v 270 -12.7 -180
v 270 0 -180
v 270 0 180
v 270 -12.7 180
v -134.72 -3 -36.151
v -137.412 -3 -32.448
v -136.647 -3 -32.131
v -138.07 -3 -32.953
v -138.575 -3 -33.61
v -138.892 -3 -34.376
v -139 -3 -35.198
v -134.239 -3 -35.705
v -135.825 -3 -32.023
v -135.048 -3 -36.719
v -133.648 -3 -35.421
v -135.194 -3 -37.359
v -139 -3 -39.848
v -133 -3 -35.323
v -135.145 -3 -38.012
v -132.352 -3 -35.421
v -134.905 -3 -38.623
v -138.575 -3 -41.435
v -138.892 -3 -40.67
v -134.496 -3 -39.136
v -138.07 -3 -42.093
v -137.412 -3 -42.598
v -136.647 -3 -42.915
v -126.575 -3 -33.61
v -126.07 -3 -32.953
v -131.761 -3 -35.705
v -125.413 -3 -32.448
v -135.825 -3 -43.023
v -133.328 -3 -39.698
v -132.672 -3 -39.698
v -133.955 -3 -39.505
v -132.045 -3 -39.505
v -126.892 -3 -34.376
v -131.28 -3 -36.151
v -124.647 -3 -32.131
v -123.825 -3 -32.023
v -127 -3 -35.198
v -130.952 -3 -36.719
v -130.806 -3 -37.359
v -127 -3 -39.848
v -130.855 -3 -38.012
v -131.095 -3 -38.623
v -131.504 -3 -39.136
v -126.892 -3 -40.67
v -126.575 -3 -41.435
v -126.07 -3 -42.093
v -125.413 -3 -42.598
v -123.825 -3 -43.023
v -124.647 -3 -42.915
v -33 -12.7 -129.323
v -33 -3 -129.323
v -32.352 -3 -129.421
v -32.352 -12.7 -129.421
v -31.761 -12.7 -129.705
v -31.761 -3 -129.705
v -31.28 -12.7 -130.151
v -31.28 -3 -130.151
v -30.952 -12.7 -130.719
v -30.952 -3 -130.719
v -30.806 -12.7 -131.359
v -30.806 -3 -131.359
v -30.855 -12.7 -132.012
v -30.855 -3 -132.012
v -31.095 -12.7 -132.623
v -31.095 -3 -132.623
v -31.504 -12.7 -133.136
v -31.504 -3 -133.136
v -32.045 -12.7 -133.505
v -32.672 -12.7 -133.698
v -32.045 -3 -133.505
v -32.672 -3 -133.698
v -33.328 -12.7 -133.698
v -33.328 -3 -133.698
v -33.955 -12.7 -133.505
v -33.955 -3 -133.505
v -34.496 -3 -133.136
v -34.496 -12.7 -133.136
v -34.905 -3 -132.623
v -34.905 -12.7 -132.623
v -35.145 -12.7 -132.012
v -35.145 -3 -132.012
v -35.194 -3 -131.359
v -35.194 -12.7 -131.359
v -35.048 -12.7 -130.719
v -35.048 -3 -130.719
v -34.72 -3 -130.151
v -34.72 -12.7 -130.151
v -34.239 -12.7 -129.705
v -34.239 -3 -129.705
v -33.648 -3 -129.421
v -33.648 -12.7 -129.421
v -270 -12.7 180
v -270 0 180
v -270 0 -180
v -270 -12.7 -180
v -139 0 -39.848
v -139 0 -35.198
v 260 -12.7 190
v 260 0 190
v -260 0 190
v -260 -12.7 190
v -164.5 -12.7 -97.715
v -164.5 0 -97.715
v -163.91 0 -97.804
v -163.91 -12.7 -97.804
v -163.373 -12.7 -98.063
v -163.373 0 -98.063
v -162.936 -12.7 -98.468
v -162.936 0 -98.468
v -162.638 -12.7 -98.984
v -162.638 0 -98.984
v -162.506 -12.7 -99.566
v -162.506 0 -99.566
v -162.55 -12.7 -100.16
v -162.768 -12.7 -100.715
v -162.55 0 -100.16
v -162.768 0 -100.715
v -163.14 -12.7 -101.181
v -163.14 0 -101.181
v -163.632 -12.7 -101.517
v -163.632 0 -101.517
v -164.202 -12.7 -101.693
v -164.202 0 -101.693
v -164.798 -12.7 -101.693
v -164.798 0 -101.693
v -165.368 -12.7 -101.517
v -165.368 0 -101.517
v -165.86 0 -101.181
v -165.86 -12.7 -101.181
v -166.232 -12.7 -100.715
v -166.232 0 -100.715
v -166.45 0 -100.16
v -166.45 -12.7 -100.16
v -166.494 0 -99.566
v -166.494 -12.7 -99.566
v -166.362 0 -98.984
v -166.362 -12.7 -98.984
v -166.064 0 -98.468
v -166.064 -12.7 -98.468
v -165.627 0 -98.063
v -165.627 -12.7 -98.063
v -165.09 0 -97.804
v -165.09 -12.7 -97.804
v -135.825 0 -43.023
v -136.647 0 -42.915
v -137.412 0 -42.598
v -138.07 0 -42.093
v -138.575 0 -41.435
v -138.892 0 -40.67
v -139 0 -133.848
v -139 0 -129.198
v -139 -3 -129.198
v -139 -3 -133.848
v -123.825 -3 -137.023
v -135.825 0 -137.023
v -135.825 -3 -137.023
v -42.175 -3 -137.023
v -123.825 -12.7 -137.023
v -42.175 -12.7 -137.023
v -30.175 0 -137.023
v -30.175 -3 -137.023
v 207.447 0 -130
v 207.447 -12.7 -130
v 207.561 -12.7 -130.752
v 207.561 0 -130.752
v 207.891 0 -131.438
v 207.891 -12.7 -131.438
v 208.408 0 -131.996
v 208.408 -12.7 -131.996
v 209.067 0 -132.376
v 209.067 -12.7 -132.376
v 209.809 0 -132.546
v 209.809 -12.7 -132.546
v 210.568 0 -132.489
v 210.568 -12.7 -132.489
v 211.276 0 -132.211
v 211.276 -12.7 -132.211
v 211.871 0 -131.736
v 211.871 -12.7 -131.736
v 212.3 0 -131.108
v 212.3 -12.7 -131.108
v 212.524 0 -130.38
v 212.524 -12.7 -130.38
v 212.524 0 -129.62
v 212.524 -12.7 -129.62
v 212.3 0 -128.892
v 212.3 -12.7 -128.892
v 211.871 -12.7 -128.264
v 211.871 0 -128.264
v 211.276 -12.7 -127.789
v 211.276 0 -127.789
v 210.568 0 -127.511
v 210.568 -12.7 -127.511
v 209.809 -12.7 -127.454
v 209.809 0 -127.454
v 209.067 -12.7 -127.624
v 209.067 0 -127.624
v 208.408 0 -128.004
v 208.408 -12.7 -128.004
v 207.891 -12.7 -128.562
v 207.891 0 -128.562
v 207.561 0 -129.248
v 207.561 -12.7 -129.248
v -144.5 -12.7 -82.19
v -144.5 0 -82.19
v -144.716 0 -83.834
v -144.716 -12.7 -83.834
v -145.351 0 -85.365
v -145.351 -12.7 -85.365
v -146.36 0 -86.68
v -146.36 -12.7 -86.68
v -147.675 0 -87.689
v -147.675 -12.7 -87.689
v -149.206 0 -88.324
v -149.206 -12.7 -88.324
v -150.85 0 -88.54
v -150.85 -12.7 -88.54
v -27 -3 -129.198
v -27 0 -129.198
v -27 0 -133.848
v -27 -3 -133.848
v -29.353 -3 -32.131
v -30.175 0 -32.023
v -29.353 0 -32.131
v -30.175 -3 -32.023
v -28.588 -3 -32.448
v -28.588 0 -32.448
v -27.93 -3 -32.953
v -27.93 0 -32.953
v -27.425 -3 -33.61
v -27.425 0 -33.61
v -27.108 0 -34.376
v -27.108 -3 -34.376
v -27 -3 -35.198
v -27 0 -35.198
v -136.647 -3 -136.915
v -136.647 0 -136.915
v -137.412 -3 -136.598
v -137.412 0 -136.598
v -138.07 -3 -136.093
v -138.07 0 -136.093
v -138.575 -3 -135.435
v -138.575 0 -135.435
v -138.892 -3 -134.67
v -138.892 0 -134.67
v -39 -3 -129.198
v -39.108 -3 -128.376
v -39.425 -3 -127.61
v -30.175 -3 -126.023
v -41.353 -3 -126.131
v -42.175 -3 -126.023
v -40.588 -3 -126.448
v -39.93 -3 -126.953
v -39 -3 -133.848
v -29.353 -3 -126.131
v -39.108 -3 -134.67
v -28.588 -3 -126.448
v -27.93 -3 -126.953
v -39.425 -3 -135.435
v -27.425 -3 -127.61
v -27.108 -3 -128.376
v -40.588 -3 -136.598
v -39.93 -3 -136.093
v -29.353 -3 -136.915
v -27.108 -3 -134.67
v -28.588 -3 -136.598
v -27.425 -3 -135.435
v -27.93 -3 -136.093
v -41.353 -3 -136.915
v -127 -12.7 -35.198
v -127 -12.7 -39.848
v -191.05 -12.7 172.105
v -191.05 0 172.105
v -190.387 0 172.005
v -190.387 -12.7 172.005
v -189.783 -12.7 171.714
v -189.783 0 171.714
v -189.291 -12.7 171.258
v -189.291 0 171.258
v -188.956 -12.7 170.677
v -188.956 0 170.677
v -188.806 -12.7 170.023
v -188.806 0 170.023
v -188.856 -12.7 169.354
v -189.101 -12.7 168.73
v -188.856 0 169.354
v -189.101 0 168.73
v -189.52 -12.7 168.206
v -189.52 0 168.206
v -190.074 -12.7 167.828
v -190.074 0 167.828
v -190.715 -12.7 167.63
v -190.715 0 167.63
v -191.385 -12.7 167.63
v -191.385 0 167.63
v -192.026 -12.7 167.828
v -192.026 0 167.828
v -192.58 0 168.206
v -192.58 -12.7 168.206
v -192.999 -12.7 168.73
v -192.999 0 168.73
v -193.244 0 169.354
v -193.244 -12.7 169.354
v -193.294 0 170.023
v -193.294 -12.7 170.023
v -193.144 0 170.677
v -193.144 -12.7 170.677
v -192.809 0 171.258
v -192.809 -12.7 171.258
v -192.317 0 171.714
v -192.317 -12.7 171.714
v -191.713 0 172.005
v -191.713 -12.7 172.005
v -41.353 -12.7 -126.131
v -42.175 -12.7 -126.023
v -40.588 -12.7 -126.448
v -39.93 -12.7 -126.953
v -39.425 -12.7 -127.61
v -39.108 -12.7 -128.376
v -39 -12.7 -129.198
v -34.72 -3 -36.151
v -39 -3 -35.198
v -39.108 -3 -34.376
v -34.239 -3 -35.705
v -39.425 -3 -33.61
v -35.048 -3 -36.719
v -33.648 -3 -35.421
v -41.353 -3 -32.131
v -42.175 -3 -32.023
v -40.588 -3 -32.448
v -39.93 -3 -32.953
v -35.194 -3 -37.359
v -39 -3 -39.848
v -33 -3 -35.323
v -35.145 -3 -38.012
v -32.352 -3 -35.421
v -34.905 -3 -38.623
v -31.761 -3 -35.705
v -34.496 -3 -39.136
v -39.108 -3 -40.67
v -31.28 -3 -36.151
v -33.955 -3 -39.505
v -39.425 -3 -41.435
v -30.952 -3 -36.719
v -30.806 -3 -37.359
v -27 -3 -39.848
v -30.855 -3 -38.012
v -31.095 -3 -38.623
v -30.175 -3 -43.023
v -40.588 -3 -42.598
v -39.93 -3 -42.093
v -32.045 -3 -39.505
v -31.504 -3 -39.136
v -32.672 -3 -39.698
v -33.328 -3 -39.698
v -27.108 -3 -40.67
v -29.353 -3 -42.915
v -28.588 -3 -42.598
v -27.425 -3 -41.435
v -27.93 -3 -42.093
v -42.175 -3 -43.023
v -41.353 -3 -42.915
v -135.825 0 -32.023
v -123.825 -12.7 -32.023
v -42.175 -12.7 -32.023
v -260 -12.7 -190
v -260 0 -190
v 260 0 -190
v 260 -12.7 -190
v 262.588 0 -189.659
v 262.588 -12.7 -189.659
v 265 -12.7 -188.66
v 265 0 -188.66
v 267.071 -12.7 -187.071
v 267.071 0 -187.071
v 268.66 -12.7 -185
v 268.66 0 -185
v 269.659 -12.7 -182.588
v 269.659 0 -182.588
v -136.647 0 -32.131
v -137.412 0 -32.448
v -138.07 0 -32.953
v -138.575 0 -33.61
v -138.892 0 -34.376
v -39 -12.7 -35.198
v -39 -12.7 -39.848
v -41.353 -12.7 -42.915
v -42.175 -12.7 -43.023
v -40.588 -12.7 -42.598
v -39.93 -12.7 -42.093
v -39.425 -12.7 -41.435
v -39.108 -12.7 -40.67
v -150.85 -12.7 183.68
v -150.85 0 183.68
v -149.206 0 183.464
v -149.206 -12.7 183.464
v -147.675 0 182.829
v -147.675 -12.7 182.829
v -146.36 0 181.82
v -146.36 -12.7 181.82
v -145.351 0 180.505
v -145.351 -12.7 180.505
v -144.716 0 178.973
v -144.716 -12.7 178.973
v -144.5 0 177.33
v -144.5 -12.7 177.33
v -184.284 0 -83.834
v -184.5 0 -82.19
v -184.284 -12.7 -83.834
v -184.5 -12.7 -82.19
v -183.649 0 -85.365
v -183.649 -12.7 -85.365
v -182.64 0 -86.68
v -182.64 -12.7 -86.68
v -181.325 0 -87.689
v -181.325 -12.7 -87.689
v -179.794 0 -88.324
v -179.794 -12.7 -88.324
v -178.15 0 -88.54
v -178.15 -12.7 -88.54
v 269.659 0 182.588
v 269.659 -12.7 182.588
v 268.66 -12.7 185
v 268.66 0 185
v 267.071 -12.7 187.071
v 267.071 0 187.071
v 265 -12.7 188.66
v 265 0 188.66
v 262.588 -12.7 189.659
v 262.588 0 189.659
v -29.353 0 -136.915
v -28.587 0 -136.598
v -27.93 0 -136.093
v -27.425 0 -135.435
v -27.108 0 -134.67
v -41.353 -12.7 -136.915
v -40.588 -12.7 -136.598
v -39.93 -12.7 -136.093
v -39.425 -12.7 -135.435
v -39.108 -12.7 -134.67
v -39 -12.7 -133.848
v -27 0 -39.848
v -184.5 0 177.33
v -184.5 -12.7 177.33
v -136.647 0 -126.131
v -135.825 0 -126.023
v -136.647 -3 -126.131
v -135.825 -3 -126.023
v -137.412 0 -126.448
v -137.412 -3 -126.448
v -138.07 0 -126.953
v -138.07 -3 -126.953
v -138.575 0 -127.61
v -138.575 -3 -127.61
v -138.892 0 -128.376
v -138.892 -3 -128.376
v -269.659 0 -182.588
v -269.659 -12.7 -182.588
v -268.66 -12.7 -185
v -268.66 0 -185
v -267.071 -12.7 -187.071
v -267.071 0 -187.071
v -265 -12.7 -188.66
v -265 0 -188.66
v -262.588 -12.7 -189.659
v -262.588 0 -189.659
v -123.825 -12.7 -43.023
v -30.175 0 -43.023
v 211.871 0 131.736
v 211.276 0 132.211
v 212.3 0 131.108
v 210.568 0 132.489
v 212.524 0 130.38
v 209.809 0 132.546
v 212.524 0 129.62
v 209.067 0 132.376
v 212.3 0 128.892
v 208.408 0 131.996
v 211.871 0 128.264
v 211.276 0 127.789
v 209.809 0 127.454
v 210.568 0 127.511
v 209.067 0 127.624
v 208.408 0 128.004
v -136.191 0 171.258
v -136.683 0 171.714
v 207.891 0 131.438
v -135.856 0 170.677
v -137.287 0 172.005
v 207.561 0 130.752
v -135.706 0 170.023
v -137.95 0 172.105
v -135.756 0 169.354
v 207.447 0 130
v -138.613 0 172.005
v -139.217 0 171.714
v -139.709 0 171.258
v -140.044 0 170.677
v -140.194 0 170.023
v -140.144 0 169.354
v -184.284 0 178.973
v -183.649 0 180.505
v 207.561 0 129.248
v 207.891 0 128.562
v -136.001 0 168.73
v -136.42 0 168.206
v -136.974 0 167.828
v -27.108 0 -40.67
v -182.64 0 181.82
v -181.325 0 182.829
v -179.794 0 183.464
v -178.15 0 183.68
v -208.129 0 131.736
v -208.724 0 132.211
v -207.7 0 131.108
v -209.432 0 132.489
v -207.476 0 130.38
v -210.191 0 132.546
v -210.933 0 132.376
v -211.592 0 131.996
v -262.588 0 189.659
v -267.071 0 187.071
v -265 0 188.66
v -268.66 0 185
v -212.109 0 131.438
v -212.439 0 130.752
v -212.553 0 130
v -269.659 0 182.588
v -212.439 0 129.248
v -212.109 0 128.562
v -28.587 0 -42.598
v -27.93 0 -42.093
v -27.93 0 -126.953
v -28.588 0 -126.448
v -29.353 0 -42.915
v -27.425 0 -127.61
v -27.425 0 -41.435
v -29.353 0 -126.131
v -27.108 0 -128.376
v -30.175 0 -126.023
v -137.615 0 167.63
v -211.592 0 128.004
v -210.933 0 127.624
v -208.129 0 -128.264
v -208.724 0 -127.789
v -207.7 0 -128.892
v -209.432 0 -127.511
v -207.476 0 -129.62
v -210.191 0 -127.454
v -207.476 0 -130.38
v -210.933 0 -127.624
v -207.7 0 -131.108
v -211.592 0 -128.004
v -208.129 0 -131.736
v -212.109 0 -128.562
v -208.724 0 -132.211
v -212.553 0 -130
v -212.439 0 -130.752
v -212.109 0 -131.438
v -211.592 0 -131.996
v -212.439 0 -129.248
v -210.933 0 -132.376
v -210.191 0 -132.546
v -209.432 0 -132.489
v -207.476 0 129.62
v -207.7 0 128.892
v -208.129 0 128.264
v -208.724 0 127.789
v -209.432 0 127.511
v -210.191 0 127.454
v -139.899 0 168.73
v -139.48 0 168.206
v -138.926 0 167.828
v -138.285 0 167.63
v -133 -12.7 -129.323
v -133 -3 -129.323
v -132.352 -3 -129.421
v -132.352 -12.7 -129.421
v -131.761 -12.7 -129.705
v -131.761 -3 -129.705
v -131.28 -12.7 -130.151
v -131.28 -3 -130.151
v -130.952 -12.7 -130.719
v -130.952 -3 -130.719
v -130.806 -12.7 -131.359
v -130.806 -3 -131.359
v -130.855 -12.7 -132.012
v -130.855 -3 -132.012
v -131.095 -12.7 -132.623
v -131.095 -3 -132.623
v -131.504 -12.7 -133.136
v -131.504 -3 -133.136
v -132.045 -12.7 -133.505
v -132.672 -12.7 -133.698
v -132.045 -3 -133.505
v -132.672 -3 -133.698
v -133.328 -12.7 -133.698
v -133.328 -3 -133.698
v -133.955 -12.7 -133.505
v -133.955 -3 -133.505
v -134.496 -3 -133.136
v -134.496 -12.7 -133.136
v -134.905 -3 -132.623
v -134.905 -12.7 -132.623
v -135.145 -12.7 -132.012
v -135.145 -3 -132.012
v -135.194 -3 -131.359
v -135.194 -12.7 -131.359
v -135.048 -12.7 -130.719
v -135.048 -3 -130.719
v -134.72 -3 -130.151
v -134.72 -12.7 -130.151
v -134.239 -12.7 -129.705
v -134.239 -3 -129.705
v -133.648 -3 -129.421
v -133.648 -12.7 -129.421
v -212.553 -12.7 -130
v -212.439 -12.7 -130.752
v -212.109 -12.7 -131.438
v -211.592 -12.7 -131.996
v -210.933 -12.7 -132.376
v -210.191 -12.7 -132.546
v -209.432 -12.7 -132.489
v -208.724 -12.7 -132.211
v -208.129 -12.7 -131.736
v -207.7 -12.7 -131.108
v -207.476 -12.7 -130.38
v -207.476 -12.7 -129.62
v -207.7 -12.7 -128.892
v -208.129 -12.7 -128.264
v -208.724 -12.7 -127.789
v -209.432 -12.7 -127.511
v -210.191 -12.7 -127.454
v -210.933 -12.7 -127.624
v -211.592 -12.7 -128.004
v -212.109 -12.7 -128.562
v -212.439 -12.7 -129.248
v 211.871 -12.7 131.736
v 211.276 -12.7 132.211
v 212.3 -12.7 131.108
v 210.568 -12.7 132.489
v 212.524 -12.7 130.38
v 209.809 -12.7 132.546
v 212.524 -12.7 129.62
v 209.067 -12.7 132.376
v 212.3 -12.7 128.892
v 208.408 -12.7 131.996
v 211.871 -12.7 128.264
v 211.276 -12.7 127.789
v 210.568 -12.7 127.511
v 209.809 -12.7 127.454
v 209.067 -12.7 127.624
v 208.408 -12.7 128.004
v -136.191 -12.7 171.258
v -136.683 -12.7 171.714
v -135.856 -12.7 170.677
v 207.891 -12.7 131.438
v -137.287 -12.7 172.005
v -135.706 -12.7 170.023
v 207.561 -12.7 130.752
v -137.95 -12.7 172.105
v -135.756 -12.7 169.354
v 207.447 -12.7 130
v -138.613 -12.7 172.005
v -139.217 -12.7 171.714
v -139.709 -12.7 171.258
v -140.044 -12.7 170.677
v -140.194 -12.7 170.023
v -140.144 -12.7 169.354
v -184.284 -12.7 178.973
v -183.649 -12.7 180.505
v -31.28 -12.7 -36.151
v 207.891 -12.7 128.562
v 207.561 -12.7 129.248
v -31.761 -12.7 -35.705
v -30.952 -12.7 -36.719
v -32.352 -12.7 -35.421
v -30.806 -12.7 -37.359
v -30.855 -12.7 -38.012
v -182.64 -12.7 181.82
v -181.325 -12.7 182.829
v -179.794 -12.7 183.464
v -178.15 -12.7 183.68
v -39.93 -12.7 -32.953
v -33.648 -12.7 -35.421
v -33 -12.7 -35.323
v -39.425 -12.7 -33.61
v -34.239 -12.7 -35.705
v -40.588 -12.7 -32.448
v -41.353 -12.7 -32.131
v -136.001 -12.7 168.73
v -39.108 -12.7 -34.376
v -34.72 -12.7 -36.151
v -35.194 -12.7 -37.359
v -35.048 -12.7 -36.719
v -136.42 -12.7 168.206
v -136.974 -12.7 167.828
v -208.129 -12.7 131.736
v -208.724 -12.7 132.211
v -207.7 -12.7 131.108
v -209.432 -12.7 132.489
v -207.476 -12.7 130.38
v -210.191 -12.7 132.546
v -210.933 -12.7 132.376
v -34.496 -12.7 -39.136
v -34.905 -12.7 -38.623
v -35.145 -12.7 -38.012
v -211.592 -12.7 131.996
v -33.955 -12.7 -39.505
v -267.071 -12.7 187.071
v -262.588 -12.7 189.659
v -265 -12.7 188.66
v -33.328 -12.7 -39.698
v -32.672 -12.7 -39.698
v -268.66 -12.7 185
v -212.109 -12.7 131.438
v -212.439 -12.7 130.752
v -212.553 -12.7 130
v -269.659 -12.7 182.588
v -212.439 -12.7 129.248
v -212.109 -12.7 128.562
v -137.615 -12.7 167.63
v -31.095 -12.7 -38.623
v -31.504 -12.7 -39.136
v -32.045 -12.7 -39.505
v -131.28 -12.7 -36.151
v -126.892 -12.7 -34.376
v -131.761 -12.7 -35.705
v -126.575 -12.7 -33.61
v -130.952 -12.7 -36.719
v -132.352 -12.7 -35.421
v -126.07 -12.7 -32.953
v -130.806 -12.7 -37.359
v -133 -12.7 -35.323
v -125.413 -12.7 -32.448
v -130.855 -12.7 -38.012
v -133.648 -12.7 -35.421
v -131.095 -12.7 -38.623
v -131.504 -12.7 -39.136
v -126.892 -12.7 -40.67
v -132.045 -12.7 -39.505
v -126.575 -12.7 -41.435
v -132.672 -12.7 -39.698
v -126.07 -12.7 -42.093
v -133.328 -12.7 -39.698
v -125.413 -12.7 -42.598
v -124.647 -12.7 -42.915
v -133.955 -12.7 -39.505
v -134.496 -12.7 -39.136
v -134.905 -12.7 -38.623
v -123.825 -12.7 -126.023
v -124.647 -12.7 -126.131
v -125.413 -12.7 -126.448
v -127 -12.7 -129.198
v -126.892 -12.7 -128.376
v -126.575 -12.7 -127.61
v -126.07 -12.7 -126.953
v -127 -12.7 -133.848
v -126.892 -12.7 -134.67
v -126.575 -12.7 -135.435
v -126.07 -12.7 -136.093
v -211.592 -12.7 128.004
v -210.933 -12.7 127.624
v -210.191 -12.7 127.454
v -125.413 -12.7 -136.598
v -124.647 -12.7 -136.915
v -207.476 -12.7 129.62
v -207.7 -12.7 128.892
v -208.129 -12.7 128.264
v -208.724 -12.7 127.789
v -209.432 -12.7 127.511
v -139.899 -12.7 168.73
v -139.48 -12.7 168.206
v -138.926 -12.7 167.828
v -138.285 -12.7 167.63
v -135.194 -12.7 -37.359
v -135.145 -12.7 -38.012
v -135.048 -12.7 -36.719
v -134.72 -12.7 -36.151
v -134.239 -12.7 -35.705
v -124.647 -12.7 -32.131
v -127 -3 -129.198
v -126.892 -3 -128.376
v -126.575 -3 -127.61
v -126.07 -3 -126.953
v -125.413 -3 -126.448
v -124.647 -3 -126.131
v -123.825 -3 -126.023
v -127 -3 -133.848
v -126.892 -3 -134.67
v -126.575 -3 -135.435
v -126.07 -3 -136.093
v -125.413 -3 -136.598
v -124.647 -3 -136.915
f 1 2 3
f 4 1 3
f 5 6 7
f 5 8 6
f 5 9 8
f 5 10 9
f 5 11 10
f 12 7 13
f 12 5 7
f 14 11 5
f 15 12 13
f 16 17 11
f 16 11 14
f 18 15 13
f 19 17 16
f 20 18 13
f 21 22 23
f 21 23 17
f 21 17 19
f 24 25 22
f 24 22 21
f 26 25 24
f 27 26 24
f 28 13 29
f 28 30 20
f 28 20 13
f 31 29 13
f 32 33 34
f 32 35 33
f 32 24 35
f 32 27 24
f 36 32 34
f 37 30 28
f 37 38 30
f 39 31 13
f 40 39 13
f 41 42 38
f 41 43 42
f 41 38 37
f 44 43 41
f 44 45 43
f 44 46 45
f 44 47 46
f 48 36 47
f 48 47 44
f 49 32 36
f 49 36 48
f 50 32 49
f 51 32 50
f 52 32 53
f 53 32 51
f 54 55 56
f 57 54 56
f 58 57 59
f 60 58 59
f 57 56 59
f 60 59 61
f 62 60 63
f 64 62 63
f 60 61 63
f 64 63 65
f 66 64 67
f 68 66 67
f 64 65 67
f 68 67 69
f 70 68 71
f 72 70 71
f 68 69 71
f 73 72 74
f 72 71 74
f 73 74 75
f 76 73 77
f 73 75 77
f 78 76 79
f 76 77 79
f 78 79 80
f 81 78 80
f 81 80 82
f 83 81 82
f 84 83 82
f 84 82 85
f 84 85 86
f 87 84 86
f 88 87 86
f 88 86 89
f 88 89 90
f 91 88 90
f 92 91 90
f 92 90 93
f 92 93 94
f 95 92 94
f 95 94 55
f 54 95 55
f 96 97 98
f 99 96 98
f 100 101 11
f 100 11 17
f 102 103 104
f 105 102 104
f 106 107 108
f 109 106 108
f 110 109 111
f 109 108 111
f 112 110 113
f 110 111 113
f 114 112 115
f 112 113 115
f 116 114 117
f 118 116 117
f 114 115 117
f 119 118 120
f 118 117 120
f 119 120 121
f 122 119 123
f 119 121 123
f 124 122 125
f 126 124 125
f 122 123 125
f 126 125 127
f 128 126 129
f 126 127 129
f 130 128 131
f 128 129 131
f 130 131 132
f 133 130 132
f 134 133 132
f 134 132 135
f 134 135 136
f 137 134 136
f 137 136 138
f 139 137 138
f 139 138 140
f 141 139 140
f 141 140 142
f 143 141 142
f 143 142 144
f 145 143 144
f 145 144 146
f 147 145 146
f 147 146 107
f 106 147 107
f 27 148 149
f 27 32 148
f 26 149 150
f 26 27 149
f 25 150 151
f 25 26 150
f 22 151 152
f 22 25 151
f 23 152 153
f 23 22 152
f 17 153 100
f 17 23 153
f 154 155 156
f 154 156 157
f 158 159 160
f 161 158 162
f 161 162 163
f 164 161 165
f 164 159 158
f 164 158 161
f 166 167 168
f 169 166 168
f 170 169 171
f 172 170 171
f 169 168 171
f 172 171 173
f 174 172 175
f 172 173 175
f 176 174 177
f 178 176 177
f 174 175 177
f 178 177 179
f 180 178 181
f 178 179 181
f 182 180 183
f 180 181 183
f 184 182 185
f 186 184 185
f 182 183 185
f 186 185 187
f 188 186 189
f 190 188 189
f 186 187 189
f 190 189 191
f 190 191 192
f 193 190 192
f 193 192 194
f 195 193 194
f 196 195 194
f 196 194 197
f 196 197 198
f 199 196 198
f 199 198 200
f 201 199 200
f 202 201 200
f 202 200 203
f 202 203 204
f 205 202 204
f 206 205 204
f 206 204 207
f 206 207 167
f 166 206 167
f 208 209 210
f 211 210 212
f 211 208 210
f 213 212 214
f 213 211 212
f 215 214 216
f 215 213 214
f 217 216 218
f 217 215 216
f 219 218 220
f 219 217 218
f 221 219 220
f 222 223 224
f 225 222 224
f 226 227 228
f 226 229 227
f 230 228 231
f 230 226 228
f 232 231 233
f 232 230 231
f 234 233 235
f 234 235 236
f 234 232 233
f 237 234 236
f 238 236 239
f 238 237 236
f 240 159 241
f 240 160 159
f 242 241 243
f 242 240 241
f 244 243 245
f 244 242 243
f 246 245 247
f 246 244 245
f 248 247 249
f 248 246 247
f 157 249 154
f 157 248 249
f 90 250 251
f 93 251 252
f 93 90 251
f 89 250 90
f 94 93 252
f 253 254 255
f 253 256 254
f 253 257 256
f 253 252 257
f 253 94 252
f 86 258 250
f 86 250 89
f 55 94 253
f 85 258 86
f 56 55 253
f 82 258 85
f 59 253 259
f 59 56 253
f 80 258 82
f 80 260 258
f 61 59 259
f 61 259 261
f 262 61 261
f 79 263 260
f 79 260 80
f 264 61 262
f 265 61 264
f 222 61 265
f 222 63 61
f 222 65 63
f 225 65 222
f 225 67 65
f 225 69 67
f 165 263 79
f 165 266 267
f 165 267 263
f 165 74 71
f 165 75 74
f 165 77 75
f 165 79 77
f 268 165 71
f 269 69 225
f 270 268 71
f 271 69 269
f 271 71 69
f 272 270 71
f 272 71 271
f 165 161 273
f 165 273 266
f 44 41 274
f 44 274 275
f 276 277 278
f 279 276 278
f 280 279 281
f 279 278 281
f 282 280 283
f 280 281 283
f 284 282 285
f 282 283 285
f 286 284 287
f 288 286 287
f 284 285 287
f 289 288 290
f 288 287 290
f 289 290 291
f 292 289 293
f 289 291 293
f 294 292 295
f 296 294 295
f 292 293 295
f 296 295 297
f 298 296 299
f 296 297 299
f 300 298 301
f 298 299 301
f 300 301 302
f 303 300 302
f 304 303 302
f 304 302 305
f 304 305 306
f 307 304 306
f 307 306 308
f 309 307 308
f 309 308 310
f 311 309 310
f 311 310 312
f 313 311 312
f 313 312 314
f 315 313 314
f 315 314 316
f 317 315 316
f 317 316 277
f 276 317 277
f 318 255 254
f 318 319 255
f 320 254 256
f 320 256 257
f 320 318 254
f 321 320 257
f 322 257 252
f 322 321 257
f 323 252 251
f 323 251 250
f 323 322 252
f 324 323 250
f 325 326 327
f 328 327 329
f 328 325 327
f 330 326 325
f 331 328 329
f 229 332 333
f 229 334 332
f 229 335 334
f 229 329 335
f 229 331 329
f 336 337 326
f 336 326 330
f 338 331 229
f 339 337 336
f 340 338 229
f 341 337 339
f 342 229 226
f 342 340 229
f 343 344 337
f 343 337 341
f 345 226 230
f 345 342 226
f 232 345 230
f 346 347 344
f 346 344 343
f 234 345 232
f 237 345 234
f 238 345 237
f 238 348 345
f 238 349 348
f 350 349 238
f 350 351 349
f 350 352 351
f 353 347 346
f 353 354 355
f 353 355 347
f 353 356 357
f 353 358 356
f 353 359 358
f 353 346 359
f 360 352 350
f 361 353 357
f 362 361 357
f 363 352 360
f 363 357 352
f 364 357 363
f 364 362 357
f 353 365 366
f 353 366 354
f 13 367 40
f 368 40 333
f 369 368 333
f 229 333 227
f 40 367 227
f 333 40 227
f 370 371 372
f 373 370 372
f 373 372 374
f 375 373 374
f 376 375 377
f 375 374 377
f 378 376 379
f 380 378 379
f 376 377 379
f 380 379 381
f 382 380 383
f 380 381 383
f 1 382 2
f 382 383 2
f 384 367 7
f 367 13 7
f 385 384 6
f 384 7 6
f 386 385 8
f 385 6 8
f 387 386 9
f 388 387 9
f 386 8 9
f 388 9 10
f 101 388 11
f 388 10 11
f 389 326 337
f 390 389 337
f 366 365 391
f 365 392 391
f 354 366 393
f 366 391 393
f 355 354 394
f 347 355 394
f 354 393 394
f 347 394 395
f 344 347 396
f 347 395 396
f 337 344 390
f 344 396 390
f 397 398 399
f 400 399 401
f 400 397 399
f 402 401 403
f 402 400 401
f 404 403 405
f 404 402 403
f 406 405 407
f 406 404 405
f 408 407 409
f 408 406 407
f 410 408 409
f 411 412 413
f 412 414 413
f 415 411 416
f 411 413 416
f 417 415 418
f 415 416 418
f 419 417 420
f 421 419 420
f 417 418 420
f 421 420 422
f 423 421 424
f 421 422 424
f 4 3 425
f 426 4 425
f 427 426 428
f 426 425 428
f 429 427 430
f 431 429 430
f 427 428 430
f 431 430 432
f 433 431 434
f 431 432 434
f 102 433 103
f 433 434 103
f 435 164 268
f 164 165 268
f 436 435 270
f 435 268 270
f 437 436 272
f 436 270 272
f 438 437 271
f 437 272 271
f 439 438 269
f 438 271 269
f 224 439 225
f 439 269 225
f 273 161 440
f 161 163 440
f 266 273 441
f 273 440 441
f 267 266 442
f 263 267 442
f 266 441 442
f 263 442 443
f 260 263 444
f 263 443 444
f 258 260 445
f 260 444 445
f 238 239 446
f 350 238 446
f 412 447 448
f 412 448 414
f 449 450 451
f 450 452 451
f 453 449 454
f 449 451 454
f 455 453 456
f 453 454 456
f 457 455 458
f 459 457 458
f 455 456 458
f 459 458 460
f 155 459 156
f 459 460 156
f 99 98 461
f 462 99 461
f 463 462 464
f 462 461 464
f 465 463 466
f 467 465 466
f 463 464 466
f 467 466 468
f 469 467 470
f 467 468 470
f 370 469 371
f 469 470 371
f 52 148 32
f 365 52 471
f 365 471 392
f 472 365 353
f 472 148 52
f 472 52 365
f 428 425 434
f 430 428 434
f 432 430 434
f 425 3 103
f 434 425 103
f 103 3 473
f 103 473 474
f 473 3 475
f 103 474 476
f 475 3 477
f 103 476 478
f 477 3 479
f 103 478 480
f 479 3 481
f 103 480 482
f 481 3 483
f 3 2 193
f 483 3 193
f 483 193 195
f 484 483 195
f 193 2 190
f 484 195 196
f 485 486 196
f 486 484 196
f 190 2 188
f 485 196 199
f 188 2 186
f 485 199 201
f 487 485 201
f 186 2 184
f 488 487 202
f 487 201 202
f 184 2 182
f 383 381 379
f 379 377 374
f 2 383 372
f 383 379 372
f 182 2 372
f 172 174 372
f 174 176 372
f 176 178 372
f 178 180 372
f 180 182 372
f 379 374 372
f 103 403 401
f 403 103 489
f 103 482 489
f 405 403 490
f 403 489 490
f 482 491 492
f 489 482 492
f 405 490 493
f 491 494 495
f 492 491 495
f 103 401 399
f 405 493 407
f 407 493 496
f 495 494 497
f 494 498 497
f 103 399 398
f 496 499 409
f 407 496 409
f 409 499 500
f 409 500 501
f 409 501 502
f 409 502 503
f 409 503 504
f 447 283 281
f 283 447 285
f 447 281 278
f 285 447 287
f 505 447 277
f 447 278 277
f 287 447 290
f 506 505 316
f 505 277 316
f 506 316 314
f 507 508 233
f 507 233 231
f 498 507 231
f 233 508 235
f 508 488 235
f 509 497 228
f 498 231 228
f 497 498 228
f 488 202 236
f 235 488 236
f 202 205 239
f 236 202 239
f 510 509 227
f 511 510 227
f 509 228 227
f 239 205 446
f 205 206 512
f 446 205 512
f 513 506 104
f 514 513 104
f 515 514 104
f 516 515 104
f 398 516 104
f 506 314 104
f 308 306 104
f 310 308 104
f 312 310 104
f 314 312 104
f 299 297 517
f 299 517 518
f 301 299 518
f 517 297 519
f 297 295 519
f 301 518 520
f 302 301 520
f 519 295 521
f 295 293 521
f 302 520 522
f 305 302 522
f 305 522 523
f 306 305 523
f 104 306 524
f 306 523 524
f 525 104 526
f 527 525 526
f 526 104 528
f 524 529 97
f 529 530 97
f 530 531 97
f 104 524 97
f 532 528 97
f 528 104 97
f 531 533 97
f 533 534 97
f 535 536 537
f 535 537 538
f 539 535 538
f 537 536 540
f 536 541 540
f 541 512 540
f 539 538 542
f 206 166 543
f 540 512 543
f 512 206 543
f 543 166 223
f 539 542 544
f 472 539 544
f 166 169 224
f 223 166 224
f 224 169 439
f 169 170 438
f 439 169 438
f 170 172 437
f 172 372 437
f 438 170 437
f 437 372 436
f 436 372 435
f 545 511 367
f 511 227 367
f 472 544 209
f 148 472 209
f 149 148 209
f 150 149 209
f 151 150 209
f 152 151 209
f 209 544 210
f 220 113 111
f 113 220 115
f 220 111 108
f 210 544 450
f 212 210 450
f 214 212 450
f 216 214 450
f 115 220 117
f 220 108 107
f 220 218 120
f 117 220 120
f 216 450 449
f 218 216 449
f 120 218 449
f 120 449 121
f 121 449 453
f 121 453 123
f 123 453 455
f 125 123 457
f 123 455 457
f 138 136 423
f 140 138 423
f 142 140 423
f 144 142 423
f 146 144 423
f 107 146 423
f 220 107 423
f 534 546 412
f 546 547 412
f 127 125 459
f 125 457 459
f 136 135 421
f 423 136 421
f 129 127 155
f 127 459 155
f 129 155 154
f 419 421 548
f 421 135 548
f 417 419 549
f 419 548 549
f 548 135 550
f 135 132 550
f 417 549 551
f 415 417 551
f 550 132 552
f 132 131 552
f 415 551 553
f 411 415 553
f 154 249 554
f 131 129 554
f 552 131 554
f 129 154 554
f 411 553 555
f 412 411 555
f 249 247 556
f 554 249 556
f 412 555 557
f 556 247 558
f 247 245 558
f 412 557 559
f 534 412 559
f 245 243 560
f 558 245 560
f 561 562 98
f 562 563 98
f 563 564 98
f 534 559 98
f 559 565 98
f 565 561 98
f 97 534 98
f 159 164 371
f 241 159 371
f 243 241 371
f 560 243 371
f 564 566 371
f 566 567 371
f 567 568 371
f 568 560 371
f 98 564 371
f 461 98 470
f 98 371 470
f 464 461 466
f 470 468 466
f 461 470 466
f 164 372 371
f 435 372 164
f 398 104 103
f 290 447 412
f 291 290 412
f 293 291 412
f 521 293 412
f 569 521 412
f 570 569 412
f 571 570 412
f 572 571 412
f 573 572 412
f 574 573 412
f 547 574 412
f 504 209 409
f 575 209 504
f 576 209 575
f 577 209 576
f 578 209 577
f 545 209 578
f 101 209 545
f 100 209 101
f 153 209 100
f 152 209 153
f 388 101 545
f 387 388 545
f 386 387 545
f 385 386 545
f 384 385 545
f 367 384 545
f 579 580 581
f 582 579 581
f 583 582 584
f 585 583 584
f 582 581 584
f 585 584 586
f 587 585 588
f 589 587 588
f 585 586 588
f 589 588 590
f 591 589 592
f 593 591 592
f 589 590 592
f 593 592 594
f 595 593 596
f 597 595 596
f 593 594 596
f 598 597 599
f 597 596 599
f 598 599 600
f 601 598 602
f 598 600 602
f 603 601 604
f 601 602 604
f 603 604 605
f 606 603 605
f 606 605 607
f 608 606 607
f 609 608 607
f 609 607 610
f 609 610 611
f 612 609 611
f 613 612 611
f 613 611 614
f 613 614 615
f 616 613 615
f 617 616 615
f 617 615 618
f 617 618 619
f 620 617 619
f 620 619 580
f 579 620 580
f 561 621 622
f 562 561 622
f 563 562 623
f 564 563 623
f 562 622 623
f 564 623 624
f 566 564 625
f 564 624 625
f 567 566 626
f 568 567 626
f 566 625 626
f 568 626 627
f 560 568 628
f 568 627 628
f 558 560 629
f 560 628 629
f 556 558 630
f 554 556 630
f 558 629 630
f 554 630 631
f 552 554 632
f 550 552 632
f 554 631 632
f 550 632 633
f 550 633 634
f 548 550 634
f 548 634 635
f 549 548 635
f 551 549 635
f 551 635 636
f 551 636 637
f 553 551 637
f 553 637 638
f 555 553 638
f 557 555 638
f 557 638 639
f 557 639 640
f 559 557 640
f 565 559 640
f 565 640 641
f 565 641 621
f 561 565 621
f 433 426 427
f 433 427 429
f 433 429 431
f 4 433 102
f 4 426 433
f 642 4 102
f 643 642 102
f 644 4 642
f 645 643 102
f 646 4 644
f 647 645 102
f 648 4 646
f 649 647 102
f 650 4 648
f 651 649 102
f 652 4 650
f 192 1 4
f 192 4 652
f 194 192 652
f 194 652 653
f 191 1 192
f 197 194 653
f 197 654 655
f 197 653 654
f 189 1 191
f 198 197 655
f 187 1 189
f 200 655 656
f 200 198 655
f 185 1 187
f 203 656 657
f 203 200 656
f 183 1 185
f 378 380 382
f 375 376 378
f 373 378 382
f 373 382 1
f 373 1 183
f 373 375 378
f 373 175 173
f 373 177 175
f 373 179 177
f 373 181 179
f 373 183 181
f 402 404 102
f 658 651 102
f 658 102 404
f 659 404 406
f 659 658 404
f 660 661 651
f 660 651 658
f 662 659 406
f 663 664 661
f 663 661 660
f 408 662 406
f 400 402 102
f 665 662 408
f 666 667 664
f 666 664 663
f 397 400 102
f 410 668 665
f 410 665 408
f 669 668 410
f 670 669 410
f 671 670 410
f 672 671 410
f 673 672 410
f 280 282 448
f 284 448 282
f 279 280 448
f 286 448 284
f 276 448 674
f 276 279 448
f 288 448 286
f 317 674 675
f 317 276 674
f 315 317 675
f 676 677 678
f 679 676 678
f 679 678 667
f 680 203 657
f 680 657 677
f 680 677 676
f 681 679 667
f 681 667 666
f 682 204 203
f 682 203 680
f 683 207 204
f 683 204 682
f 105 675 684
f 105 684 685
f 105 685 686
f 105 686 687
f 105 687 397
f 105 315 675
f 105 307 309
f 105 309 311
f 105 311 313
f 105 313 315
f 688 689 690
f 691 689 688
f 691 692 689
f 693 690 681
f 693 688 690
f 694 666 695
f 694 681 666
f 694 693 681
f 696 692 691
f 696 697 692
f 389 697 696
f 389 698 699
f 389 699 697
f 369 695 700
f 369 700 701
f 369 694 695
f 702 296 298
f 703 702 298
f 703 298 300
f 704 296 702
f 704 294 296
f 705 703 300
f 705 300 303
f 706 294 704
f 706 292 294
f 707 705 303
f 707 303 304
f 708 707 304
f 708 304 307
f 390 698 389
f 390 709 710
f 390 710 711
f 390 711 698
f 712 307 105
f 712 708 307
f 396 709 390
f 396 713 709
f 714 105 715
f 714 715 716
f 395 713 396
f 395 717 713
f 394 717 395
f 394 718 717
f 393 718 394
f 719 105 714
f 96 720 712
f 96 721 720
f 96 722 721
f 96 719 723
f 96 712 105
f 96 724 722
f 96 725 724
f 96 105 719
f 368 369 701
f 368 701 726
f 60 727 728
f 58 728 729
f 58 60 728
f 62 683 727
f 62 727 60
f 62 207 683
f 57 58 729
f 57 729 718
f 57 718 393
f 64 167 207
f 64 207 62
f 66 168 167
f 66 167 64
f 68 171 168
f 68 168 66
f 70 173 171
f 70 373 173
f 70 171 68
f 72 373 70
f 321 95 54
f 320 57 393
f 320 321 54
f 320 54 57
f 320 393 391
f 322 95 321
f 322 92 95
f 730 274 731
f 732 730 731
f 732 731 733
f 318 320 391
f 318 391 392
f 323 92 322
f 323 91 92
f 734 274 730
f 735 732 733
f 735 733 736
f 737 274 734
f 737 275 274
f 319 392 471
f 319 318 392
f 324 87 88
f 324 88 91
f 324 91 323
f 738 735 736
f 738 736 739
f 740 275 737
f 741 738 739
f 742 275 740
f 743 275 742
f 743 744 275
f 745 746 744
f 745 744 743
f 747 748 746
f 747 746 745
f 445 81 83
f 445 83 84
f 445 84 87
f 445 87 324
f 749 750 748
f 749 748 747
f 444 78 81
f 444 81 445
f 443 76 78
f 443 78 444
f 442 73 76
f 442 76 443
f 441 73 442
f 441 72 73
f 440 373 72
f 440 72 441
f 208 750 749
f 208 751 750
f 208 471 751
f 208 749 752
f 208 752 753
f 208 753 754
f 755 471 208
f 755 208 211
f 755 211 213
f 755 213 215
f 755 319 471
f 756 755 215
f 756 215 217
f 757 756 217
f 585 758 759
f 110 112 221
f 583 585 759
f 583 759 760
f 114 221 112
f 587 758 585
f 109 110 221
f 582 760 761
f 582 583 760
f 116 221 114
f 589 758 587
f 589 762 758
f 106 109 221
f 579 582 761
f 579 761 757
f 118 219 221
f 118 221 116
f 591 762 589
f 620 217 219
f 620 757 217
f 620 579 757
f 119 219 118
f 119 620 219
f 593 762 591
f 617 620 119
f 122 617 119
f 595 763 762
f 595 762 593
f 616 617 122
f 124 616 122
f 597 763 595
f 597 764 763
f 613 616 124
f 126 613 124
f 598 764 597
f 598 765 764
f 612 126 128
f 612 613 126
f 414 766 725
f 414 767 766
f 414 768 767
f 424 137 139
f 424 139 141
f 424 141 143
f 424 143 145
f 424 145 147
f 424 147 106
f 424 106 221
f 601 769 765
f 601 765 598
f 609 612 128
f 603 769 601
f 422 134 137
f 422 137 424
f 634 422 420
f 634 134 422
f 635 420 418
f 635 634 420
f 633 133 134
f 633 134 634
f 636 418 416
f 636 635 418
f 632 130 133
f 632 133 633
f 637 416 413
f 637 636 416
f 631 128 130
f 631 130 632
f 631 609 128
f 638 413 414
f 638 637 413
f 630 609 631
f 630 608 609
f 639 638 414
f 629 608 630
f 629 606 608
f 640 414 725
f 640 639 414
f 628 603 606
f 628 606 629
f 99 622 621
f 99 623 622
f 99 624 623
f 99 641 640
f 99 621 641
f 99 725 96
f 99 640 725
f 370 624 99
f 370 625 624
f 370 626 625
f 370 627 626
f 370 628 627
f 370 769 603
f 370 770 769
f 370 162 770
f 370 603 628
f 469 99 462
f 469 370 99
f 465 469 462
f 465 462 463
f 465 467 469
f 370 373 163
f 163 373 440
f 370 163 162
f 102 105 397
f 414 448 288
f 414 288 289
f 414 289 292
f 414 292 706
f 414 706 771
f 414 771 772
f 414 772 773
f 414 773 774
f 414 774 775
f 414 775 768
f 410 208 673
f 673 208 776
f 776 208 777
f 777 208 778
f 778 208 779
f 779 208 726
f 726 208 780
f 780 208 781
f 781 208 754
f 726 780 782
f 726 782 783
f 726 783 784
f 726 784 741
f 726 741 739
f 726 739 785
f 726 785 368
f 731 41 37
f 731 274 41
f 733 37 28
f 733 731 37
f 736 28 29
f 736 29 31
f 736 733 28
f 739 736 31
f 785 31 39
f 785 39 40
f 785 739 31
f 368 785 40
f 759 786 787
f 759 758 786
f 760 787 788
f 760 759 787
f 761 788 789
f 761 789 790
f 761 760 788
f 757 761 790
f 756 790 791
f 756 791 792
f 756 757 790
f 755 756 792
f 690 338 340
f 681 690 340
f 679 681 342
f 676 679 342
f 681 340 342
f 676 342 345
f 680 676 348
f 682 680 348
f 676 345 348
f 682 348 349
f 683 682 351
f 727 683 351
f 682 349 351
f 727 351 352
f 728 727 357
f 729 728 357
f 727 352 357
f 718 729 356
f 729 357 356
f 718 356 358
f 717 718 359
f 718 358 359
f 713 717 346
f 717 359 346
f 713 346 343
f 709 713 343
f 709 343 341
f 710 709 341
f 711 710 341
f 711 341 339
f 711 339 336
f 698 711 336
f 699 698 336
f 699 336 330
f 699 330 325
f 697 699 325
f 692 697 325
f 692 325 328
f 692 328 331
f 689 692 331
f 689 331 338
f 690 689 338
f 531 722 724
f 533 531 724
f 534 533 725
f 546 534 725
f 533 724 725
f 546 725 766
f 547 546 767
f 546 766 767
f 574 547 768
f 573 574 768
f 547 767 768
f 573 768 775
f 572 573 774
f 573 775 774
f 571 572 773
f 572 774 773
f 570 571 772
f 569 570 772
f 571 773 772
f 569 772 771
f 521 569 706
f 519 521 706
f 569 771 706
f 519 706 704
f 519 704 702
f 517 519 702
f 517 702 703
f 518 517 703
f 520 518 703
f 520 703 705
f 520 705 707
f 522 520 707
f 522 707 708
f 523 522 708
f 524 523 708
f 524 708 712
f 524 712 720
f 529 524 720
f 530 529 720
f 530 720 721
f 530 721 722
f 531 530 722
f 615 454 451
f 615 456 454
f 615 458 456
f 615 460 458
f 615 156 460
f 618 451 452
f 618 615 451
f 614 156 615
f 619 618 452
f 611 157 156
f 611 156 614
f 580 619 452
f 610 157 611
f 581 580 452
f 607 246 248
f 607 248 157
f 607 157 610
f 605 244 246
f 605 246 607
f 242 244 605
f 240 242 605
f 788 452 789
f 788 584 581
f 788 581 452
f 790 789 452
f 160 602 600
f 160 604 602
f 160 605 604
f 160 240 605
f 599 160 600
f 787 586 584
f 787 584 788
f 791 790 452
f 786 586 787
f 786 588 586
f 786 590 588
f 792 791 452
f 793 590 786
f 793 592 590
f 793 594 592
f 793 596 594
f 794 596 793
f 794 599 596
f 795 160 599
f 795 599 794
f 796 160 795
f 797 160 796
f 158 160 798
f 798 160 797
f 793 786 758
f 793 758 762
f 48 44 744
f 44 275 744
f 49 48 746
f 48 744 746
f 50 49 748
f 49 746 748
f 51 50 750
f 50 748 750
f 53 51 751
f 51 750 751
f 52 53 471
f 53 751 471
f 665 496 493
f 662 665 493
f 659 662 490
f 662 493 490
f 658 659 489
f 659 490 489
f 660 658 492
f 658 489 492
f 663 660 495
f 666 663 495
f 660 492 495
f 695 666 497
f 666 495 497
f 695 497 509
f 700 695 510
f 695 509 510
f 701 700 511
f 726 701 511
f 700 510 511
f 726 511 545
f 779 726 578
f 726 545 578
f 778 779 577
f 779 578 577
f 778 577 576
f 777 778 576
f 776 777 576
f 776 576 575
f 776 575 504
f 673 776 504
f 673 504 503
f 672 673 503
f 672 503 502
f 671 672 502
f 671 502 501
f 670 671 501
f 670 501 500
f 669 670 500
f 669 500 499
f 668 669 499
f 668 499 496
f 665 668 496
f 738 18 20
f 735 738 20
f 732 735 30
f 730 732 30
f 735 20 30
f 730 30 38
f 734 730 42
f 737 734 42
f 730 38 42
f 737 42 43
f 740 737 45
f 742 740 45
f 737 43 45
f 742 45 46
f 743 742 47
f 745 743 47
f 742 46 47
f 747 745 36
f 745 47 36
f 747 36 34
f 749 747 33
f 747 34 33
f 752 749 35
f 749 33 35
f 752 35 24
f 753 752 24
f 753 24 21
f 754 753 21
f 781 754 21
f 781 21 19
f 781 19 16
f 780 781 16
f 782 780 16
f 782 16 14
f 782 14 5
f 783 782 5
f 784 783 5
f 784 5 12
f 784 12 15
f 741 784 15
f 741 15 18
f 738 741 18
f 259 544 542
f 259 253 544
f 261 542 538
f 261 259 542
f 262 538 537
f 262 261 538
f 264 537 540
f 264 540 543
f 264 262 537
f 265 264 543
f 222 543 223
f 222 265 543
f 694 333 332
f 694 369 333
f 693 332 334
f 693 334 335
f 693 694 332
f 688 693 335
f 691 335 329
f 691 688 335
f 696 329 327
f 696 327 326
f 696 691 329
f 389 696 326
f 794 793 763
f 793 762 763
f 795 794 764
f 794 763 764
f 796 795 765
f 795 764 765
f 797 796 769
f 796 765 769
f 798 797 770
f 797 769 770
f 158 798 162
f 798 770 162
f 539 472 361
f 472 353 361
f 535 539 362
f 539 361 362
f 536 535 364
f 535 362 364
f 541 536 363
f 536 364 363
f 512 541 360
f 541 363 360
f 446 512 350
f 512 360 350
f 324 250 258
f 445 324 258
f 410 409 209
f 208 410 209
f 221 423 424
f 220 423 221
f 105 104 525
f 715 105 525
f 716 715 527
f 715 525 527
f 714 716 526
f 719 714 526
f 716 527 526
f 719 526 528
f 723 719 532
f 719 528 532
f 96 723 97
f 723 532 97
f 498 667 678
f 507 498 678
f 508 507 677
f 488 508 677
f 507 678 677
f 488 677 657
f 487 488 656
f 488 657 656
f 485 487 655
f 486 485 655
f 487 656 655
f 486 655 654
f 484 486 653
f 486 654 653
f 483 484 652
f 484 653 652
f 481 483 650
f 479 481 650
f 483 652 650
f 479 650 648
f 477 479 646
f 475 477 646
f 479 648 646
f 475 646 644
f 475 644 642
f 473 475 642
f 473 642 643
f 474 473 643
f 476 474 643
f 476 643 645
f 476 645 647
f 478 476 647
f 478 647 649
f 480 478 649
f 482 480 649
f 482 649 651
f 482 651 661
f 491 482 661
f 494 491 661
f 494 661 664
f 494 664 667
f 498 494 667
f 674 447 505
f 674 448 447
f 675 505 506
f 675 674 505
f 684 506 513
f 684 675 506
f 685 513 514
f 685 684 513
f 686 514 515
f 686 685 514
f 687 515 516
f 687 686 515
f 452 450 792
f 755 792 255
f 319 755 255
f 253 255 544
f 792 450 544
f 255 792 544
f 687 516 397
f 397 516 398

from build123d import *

# Parameters (mm, degrees)
BOSS_EXTRUDE1_DEPTH         = 12.7
TAP_DRILL_FOR_1_4_20_TAP1_D = 5.1054
SKETCH10_R                  = 2.25
SKETCH10_R_2                = 2.2
CUT_EXTRUDE1_DEPTH          = 331.395656751
CUT_EXTRUDE2_REACH          = 332.396
SKETCH11_W                  = 88
SKETCH11_H                  = 11
SKETCH12_W                  = 40
SKETCH12_H                  = 272.22
CUT_EXTRUDE3_DEPTH          = 331.395656751
SKETCH13_W                  = 12
SKETCH13_H                  = 11
CUT_EXTRUDE4_DEPTH          = 3
FILLET2_R                   = 6.35
FILLET3_R                   = 3.175
SKETCH14_R                  = 2
CUT_EXTRUDE5_DEPTH          = 331.395656751


with BuildPart() as part:
    # Sketch1 → Boss-Extrude1 (new body)
    with BuildSketch(Plane(origin=(0, 0, 0), x_dir=(1, 0, 0), z_dir=(0, 1, 0))):
        with BuildLine():
            Line((-260, 190), (260, 190))
            ThreePointArc((260, 190), (267.071067812, 187.071067812), (270, 180))
            Line((270, 180), (270, -180))
            ThreePointArc((270, -180), (267.071067812, -187.071067812), (260, -190))
            Line((260, -190), (-260, -190))
            ThreePointArc((-260, -190), (-267.071067812, -187.071067812), (-270, -180))
            Line((-270, -180), (-270, 180))
            ThreePointArc((-270, 180), (-267.071067812, 187.071067812), (-260, 190))
        make_face()
    extrude(amount=-BOSS_EXTRUDE1_DEPTH)

    # Tap Drill for 1/4-20 Tap1 (through all)
    with Locations(Plane(origin=(0, 0, 0), x_dir=(1, 0, 0), z_dir=(0, 1, 0))):
        with Locations((-210, 130), (-210, -130), (210, 130), (210, -130)):
            Hole(TAP_DRILL_FOR_1_4_20_TAP1_D / 2)

    # Sketch10 → Cut-Extrude1 (cut, through all)
    with BuildSketch(Plane(origin=(0, 0, 0), x_dir=(1, 0, 0), z_dir=(0, 1, 0))):
        with Locations(Location((-137.95, -169.854932, 0), (0, 0, 270))):
            Circle(SKETCH10_R)
        with Locations(Location((-191.05, -169.854932, 0), (0, 0, 270))):
            Circle(SKETCH10_R)
        with Locations(Location((-133, 131.522913005, 0), (0, 0, 270))):
            Circle(SKETCH10_R_2)
        with Locations(Location((-33, 131.522913005, 0), (0, 0, 270))):
            Circle(SKETCH10_R_2)
        with Locations(Location((-133, 37.522913005, 0), (0, 0, 270))):
            Circle(SKETCH10_R_2)
        with Locations(Location((-33, 37.522913005, 0), (0, 0, 270))):
            Circle(SKETCH10_R_2)
    extrude(amount=-CUT_EXTRUDE1_DEPTH, mode=Mode.SUBTRACT)

    # Sketch11 → Cut-Extrude2 (cut, up to next)
    with BuildSketch(Plane(origin=(0, 0, 0), x_dir=(1, 0, 0), z_dir=(0, 1, 0)), mode=Mode.PRIVATE) as cut_extrude2_sk1:
        with Locations((-83, 37.522913005)):
            Rectangle(SKETCH11_W, SKETCH11_H)
    cut_extrude2_tool1 = extrude(cut_extrude2_sk1.sketch, amount=-CUT_EXTRUDE2_REACH, mode=Mode.PRIVATE) & part.part
    # Sketch11 → Cut-Extrude2 (cut, up to next)
    with BuildSketch(Plane(origin=(0, 0, 0), x_dir=(1, 0, 0), z_dir=(0, 1, 0)), mode=Mode.PRIVATE) as cut_extrude2_sk2:
        with Locations((-83, 131.522913005)):
            Rectangle(SKETCH11_W, SKETCH11_H)
    cut_extrude2_tool2 = extrude(cut_extrude2_sk2.sketch, amount=-CUT_EXTRUDE2_REACH, mode=Mode.PRIVATE) & part.part
    add(cut_extrude2_tool1.solids().sort_by_distance((-83, 0, -37.522913))[0], mode=Mode.SUBTRACT)
    add(cut_extrude2_tool2.solids().sort_by_distance((-83, 0, -131.522913))[0], mode=Mode.SUBTRACT)

    # Sketch12 → Cut-Extrude3 (cut, through all)
    with BuildSketch(Plane(origin=(0, 0, 0), x_dir=(1, 0, 0), z_dir=(0, 1, 0))):
        with Locations((-164.5, -47.569932)):
            Rectangle(SKETCH12_W, SKETCH12_H)
    extrude(amount=-CUT_EXTRUDE3_DEPTH, mode=Mode.SUBTRACT)

    # Sketch13 → Cut-Extrude4 (cut)
    with BuildSketch(Plane(origin=(0, 0, 0), x_dir=(1, 0, 0), z_dir=(0, 1, 0))):
        with Locations((-33, 37.522913005)):
            Rectangle(SKETCH13_W, SKETCH13_H)
        with Locations((-33, 131.522913005)):
            Rectangle(SKETCH13_W, SKETCH13_H)
        with Locations((-133, 37.522913005)):
            Rectangle(SKETCH13_W, SKETCH13_H)
        with Locations((-133, 131.522913005)):
            Rectangle(SKETCH13_W, SKETCH13_H)
    extrude(amount=-CUT_EXTRUDE4_DEPTH, mode=Mode.SUBTRACT)

    # Fillet2
    fillet2_edges = [part.edges().sort_by_distance(p)[0] for p in [
        (-144.5, -6.35, -88.540068),
        (-144.5, -6.35, 183.679932),
        (-184.5, -6.35, 183.679932),
        (-184.5, -6.35, -88.540068),
    ]]
    fillet(fillet2_edges, radius=FILLET2_R)

    # Fillet3
    fillet3_edges = [part.edges().sort_by_distance(p)[0] for p in [
        (-127, -7.85, -32.022913005),
        (-127, -7.85, -43.022913005),
        (-39, -7.85, -43.022913005),
        (-39, -7.85, -32.022913005),
        (-39, -7.85, -137.022913005),
        (-39, -7.85, -126.022913005),
        (-127, -7.85, -126.022913005),
        (-127, -7.85, -137.022913005),
        (-27, -1.5, -137.022913005),
        (-27, -1.5, -126.022913005),
        (-139, -1.5, -32.022913005),
        (-139, -1.5, -43.022913005),
        (-139, -1.5, -126.022913005),
        (-139, -1.5, -137.022913005),
        (-27, -1.5, -43.022913005),
        (-27, -1.5, -32.022913005),
    ]]
    fillet(fillet3_edges, radius=FILLET3_R)

    # Sketch14 → Cut-Extrude5 (cut, through all)
    with BuildSketch(Plane(origin=(0, 0, 0), x_dir=(1, 0, 0), z_dir=(0, 1, 0))):
        with Locations(Location((-164.5, 99.715068, 0), (0, 0, 270))):
            Circle(SKETCH14_R)
    extrude(amount=-CUT_EXTRUDE5_DEPTH, mode=Mode.SUBTRACT)


solid = part.part
